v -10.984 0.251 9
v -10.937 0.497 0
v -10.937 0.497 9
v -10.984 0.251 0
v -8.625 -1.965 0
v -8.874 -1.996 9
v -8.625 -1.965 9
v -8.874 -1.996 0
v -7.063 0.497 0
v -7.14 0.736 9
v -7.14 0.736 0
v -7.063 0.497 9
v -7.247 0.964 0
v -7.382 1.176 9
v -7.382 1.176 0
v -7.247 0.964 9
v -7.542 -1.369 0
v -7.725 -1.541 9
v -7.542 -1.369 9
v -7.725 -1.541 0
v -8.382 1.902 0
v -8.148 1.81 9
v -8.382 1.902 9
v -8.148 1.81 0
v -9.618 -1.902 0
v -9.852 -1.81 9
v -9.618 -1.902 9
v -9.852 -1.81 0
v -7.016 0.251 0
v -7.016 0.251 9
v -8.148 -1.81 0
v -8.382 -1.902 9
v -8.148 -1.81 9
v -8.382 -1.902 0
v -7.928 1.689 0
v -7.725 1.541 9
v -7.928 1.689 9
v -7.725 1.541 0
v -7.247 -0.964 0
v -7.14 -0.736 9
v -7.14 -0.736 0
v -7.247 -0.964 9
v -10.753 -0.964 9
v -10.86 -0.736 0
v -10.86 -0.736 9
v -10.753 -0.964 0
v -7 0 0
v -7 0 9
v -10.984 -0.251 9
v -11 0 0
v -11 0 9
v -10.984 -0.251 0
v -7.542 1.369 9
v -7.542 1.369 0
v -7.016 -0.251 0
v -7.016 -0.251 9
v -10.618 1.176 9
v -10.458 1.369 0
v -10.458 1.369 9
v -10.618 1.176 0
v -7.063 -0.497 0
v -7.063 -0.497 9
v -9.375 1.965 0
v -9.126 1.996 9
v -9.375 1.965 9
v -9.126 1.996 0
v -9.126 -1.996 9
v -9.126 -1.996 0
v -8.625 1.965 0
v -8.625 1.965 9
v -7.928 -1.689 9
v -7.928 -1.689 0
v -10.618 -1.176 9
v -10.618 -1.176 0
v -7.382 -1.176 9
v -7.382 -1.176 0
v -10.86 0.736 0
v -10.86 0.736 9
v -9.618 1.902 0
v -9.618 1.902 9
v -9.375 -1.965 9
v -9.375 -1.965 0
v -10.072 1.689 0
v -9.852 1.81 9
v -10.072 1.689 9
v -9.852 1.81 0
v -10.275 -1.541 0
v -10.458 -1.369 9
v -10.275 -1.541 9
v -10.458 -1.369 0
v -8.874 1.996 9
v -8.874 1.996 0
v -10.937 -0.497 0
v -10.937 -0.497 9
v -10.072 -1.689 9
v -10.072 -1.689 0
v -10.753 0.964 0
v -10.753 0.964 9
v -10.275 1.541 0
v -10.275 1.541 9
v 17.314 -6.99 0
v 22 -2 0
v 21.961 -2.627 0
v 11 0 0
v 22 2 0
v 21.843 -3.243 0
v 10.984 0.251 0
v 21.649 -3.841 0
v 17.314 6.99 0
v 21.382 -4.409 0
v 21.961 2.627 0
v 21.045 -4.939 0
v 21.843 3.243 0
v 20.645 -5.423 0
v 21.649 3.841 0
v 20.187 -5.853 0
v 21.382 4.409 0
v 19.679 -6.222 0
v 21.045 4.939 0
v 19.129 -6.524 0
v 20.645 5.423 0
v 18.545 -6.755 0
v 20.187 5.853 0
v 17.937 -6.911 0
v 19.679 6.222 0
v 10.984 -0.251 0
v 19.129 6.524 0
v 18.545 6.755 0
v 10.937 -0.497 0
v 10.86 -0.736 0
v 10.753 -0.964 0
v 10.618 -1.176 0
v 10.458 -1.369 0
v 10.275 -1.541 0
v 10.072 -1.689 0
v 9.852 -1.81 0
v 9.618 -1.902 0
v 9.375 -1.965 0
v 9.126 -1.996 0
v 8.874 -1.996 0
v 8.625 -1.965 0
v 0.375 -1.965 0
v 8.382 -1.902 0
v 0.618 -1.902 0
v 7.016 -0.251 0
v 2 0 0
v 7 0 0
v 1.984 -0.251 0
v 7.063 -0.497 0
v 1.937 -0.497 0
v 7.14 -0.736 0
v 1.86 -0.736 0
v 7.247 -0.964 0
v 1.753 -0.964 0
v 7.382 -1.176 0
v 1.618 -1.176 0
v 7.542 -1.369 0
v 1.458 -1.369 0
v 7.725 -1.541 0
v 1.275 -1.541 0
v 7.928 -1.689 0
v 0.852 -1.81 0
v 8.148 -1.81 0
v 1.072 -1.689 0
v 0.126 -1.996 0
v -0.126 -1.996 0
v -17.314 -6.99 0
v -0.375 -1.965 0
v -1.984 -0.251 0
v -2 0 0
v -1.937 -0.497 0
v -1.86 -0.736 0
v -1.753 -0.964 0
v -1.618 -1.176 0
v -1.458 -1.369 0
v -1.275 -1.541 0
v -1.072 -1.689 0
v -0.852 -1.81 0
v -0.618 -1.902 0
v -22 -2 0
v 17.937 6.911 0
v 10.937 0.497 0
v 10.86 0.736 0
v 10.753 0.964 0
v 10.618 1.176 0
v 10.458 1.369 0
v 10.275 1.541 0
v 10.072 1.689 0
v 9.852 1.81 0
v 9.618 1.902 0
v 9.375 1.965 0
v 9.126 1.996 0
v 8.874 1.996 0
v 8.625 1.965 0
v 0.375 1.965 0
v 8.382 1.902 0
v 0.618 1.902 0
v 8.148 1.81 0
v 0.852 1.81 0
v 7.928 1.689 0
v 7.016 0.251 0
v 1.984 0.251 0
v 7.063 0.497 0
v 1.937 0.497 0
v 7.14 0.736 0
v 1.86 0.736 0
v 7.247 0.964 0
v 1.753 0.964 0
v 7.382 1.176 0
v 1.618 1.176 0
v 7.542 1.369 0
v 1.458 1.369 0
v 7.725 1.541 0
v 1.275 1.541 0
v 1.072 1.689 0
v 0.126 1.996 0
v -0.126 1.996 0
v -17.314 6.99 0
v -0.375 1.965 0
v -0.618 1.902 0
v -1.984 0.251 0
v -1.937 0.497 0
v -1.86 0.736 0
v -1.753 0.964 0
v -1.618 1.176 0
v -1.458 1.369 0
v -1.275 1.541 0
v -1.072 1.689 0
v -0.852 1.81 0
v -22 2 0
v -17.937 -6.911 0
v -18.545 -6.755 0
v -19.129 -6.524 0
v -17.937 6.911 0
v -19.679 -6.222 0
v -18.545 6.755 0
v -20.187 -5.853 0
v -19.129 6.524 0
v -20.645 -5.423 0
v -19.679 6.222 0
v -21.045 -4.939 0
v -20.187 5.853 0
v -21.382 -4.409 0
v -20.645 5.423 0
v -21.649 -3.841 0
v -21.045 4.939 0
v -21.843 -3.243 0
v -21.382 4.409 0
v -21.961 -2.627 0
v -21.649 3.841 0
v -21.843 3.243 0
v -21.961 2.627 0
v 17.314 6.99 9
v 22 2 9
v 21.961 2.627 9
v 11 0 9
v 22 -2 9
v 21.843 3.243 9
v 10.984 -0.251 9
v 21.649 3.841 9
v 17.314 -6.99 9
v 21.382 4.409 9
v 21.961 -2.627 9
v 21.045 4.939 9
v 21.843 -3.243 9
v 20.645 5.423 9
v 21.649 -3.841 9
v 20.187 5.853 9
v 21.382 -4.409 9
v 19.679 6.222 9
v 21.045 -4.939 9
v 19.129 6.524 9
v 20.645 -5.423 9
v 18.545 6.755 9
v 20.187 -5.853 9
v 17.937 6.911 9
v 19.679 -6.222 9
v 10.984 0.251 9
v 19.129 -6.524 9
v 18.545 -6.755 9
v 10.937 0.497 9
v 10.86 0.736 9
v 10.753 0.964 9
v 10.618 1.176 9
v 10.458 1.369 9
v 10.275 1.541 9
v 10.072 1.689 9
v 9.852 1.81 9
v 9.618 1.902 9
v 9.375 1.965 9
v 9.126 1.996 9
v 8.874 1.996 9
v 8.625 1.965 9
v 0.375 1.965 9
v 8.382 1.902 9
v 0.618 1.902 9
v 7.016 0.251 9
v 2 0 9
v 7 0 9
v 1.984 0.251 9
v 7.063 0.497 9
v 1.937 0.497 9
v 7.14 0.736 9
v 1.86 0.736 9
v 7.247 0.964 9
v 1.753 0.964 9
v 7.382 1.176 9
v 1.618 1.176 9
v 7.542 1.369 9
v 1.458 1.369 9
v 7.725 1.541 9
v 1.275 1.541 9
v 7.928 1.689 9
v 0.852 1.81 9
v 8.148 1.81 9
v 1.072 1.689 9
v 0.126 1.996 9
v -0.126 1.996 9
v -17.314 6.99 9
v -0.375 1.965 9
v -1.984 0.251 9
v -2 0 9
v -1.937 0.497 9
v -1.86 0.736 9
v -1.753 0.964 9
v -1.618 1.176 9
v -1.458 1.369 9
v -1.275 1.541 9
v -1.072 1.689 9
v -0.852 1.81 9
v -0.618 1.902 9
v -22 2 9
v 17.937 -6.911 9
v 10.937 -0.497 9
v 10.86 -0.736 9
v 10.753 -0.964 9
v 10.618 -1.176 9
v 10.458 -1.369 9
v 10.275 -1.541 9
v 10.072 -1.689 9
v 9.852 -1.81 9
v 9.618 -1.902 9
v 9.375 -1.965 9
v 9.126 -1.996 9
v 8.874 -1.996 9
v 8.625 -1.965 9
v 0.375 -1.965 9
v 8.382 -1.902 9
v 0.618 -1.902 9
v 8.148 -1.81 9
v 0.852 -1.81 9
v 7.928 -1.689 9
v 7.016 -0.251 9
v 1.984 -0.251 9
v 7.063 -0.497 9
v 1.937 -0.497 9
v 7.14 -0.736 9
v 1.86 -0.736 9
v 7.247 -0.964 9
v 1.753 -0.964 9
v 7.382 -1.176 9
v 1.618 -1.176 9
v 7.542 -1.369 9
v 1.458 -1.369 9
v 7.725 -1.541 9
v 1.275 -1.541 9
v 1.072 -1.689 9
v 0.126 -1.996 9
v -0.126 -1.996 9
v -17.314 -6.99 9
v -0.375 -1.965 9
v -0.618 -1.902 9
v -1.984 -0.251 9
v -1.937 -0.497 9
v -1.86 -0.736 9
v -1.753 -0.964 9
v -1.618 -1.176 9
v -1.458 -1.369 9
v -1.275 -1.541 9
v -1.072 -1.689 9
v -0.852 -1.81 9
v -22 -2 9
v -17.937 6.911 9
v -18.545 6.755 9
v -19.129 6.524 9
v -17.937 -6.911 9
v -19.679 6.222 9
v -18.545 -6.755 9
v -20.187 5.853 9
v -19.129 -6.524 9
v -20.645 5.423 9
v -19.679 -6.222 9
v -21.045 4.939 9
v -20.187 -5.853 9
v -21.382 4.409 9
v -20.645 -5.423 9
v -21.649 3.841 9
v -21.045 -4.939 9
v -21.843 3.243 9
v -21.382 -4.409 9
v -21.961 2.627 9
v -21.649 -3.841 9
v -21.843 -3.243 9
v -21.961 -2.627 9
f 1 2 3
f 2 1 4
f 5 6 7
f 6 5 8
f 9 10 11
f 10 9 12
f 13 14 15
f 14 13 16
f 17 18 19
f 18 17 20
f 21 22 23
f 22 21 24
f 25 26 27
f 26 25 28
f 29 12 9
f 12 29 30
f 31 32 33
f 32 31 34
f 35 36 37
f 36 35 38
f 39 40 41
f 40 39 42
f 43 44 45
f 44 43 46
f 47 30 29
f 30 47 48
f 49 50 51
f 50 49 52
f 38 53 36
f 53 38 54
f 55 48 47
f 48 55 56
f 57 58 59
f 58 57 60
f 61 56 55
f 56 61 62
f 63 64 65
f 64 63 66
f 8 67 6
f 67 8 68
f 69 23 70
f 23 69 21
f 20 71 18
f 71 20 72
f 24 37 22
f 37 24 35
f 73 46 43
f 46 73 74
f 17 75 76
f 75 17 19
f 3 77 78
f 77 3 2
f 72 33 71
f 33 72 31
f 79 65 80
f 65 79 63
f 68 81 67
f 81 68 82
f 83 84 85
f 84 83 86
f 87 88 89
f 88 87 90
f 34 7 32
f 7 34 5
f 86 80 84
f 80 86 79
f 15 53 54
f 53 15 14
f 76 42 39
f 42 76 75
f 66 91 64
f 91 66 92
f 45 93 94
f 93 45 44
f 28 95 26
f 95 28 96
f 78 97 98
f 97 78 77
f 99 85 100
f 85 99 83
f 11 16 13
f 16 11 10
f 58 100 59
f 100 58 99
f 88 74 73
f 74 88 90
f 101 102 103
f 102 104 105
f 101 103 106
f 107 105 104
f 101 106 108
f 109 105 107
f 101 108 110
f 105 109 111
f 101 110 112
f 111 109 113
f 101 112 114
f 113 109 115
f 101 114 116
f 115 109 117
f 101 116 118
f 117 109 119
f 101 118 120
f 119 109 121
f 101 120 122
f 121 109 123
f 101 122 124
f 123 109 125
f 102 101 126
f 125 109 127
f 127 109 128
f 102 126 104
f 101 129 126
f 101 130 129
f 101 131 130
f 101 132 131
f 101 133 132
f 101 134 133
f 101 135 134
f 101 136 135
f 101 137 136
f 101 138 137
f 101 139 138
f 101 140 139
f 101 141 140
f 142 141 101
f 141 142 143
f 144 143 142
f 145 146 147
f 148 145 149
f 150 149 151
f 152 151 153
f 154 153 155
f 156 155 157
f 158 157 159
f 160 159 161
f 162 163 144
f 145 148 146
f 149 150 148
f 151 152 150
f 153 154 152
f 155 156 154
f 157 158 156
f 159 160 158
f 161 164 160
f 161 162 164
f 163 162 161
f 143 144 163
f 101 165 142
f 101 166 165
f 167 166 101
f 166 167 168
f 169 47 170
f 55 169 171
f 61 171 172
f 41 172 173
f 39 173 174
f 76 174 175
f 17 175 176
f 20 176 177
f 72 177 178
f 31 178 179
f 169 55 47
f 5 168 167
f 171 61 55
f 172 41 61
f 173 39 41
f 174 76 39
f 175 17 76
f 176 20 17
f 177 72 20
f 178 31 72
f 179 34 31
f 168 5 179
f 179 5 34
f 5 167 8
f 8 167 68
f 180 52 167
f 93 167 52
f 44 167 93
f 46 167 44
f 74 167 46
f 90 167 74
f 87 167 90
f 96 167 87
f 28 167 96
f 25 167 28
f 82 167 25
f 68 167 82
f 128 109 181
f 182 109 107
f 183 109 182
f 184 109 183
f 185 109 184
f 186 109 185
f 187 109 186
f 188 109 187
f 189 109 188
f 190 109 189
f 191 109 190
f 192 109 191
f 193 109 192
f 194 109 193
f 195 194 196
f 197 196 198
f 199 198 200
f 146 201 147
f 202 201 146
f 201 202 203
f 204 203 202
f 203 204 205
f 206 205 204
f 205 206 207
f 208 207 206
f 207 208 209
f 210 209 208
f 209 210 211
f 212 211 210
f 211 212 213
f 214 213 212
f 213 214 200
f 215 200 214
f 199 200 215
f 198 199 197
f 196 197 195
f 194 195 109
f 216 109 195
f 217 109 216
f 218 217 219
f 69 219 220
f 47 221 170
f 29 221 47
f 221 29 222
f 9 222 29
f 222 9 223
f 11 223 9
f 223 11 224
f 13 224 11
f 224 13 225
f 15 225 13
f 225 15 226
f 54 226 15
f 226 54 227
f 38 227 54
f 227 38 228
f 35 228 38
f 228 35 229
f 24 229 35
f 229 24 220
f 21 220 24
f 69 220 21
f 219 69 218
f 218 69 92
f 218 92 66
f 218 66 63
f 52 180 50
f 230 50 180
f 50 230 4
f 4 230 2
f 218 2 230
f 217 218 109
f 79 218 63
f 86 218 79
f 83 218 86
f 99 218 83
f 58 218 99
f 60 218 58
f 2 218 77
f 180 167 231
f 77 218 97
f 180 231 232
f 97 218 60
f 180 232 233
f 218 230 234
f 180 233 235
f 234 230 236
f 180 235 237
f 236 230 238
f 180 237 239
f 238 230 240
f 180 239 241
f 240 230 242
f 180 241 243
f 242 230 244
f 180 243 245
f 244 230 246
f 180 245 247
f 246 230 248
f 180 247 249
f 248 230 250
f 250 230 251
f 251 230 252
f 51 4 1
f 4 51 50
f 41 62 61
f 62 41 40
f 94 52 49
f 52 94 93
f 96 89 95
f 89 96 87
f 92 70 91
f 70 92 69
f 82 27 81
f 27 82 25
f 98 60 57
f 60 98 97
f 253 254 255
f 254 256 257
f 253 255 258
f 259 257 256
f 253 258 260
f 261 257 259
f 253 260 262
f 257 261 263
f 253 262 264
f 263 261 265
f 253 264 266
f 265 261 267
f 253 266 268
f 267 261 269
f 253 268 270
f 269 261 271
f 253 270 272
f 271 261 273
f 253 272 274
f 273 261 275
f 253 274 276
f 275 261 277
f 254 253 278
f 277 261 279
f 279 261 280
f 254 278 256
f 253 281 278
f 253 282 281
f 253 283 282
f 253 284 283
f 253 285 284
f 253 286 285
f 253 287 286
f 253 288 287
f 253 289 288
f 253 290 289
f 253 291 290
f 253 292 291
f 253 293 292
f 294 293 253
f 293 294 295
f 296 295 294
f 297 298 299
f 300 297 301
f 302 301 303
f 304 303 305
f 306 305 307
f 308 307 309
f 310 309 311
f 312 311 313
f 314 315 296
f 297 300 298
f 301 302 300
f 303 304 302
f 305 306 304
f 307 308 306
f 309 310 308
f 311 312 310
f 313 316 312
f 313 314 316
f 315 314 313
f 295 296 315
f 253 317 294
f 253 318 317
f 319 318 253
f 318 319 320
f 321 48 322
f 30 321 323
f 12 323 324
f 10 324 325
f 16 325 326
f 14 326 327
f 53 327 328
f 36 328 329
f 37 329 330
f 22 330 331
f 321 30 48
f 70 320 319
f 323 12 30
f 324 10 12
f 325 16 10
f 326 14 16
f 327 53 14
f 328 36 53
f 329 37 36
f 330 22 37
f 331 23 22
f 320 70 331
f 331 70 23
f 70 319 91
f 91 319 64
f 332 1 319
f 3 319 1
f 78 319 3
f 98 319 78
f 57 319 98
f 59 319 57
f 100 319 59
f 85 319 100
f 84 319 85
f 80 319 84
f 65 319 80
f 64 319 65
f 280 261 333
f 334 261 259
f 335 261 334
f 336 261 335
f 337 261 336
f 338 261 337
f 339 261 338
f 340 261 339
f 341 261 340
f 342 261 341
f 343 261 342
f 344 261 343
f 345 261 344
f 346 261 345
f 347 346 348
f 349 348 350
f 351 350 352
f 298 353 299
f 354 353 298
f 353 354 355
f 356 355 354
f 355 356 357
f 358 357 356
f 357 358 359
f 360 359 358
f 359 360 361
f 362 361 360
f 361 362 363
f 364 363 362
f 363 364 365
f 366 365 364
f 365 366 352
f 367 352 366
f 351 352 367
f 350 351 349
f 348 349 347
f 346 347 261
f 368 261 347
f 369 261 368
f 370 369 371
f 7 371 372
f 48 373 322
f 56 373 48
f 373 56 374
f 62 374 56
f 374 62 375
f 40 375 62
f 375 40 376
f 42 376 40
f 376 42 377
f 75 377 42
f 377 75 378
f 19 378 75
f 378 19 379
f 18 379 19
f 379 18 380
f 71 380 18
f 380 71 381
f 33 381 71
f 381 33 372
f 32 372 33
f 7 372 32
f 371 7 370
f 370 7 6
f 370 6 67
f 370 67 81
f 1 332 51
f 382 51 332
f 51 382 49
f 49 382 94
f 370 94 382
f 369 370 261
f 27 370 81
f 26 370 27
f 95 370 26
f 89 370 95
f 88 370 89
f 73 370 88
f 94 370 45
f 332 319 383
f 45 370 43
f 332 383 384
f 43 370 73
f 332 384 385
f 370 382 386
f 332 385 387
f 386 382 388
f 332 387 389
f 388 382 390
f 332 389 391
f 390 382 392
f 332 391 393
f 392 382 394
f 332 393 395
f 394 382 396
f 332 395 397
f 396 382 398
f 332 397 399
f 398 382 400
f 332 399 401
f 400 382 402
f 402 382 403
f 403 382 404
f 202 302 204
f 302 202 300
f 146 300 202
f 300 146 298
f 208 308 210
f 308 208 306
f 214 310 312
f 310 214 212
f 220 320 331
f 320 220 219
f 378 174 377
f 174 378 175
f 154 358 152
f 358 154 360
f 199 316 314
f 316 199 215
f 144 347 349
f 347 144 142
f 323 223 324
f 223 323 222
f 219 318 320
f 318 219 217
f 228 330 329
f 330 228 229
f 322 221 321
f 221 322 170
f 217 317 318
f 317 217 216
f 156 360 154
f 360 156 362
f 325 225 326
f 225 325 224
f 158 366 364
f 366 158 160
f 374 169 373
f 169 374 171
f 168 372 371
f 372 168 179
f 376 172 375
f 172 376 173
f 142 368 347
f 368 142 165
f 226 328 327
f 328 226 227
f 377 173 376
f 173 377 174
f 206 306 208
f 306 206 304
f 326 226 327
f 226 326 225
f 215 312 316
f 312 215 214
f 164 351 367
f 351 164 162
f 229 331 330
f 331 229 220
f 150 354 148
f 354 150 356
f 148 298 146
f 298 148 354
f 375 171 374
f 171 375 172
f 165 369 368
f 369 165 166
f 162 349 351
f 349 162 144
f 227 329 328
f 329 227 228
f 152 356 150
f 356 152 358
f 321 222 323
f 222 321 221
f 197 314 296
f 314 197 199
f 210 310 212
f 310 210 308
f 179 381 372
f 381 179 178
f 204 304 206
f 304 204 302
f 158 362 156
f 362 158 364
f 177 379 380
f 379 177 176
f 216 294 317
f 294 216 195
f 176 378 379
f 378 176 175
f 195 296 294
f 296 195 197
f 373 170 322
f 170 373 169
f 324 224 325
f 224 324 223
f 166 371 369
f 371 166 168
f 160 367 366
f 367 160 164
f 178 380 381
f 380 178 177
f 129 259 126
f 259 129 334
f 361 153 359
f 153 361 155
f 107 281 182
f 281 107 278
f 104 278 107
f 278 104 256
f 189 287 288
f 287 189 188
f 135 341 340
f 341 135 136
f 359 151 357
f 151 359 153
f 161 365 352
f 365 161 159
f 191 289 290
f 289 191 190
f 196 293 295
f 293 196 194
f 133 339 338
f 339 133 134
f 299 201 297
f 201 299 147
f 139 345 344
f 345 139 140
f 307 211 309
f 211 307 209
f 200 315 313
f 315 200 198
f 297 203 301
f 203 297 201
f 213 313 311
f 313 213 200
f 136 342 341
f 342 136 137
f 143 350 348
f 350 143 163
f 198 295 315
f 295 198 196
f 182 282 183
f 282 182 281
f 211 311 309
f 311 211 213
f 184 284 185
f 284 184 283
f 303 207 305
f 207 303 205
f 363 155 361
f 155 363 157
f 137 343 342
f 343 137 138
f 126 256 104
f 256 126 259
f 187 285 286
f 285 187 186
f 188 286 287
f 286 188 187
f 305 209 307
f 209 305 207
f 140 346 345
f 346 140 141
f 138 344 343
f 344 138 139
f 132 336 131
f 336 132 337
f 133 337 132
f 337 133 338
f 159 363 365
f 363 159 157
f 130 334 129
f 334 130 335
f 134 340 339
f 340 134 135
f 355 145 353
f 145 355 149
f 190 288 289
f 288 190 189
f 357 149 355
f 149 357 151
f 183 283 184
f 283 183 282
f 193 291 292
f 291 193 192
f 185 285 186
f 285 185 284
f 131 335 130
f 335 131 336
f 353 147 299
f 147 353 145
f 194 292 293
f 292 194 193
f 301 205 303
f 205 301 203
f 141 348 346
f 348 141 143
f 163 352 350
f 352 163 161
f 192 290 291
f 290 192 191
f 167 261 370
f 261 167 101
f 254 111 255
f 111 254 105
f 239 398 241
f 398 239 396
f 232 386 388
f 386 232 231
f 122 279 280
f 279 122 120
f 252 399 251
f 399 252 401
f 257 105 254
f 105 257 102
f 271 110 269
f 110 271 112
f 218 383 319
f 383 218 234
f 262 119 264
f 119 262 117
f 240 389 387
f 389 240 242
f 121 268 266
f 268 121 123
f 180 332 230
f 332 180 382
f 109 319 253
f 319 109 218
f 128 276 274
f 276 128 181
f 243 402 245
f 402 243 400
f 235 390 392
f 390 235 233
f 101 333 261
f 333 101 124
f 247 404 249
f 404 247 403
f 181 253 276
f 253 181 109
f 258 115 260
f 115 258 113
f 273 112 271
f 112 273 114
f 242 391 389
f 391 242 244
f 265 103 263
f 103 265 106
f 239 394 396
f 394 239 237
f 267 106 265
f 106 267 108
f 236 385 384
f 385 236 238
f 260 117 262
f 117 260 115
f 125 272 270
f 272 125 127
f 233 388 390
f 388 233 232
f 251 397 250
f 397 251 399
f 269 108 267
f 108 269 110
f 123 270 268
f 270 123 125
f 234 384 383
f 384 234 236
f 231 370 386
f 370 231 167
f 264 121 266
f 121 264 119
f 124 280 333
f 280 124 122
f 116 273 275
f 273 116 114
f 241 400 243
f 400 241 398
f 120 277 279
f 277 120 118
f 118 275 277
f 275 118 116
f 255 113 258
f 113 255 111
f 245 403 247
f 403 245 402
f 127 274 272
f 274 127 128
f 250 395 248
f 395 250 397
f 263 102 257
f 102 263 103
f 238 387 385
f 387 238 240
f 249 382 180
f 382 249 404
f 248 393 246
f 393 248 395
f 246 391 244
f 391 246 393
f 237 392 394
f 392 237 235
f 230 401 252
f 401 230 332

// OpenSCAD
$fn = 50;

difference() {
	union() {
		hull() {
			translate(v = [-17.0, 2.0, 0]) {
				cylinder(h = 9, r = 5);
			}
			translate(v = [17.0, 2.0, 0]) {
				cylinder(h = 9, r = 5);
			}
			translate(v = [-17.0, -2.0, 0]) {
				cylinder(h = 9, r = 5);
			}
			translate(v = [17.0, -2.0, 0]) {
				cylinder(h = 9, r = 5);
			}
		}
	}
	union() {
		translate(v = [-9.0, 0, 0.0]) {
			cylinder(h = 9, r = 2.0);
		}
		cylinder(h = 9, r = 2.0);
		translate(v = [9.0, 0, 0.0]) {
			cylinder(h = 9, r = 2.0);
		}
	}
}
